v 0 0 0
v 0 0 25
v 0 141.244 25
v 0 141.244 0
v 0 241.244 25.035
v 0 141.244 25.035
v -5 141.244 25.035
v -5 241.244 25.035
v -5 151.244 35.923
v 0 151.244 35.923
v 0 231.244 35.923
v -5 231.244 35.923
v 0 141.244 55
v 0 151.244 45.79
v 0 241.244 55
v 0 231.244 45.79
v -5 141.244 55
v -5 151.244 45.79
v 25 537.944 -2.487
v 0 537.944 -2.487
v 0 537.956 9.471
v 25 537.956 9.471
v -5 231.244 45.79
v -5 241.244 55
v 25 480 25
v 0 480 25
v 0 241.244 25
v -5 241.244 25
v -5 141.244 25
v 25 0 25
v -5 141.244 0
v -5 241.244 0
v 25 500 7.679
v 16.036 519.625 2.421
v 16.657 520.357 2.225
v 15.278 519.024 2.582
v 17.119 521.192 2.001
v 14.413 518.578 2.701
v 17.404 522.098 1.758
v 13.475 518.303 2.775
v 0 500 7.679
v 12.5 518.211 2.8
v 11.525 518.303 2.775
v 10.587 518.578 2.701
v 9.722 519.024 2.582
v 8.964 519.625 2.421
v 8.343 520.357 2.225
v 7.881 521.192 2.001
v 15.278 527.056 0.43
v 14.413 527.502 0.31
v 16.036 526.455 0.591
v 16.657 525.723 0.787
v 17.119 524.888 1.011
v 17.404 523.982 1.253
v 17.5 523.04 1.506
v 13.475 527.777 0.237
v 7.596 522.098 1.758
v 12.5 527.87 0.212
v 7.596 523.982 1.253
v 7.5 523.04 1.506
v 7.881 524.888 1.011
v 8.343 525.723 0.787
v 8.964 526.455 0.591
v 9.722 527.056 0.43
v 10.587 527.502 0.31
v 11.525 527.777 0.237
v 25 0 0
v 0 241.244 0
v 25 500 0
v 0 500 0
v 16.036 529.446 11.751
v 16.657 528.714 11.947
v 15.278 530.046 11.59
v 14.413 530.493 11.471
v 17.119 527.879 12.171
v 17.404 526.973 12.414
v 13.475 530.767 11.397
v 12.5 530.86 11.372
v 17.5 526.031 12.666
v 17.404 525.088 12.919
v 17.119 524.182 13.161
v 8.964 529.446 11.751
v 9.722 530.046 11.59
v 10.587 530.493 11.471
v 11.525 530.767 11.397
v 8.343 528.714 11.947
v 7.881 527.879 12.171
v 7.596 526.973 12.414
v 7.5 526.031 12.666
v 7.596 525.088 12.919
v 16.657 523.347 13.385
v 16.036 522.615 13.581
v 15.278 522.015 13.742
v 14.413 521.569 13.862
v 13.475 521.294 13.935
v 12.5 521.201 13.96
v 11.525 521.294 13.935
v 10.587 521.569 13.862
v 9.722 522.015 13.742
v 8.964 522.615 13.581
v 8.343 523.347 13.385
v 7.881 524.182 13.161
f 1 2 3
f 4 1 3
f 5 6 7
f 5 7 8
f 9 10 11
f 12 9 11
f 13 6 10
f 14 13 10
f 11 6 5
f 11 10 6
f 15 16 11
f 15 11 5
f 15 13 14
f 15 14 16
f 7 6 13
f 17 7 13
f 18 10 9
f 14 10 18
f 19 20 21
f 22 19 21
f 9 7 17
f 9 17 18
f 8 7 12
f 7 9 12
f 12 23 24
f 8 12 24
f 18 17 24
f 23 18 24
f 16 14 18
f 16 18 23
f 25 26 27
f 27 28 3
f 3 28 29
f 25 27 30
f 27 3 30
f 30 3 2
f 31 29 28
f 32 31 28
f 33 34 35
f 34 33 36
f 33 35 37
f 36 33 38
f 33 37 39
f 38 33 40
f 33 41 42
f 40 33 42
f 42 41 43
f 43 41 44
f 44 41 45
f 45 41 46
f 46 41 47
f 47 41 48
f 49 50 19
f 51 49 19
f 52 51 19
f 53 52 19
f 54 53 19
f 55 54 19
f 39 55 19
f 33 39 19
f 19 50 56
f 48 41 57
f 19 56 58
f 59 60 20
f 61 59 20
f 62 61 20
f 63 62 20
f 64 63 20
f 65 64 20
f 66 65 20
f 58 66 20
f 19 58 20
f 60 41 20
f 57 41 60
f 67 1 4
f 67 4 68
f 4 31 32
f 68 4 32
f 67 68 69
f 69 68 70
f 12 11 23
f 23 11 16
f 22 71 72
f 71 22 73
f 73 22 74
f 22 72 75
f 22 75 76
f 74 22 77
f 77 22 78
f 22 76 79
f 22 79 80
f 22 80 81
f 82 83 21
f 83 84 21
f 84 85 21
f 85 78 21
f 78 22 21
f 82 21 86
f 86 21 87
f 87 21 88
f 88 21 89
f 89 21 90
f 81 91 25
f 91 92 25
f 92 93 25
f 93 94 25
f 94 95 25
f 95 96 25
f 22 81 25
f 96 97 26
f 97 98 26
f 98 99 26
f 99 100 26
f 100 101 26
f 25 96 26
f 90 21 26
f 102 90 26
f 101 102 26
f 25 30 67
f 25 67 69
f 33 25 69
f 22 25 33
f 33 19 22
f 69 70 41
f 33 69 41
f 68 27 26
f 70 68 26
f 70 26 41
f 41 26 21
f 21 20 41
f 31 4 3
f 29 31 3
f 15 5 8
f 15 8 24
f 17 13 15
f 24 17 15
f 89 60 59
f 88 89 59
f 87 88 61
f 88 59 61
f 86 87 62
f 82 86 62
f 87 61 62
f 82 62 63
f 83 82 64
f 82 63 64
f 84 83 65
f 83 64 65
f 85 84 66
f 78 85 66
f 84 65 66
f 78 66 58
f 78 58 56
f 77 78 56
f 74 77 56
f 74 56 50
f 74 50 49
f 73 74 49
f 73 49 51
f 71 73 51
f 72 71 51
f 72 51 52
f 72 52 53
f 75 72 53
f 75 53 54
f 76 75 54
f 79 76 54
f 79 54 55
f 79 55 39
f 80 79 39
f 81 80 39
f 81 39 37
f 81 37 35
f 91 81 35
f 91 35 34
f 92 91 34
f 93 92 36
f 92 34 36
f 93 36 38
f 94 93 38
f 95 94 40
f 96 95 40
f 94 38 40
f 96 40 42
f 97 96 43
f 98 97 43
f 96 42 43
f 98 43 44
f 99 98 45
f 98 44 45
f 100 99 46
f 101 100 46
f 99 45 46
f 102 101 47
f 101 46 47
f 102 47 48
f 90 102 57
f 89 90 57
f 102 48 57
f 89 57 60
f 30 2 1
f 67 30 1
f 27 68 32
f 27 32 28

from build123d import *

# Parameters (mm, degrees)
F1_DEPTH = 25
F3_D     = 10
F4_W     = 100
F4_H     = 29.9654065818
F4_W_2   = 80
F4_H_2   = 9.8667964339
F5_DEPTH = 5
F4_H_3   = 25


with BuildPart() as f1:
    # F0 (on Right) → F1 (new body)
    with BuildSketch(Plane.YZ):
        Polygon((0, 25), (0, 0), (500, 0), (500, 7.6794919243), (537.9435295104, -2.487446166), (537.9555495773, 9.4708572938), (480, 25), align=None)
    extrude(amount=F1_DEPTH)

    # F3 (through all)
    with Locations(Plane(origin=(0, 38.4039030917, 143.3253175473), x_dir=(1, 0, 0), z_dir=(0, 0.2588190451, 0.9659258263))):
        with Locations((12.5, 504.8282497212)):
            Hole(F3_D / 2)

    # F4 (on face) → F5, piece 2 (join)
    with BuildSketch(Plane.YZ):
        with Locations((191.2442117929, 12.5)):
            Rectangle(F4_W, F4_H_3)
    extrude(amount=-F5_DEPTH)


with BuildPart() as f5:
    # F4 (on face) → F5 (new body)
    with BuildSketch(Plane.YZ):
        with Locations((191.2442117929, 40.0172967091)):
            Rectangle(F4_W, F4_H)
        with Locations((191.2442117929, 40.8562459052)):
            Rectangle(F4_W_2, F4_H_2, mode=Mode.SUBTRACT)
    extrude(amount=-F5_DEPTH)


solid = Compound([f1.part, f5.part])
